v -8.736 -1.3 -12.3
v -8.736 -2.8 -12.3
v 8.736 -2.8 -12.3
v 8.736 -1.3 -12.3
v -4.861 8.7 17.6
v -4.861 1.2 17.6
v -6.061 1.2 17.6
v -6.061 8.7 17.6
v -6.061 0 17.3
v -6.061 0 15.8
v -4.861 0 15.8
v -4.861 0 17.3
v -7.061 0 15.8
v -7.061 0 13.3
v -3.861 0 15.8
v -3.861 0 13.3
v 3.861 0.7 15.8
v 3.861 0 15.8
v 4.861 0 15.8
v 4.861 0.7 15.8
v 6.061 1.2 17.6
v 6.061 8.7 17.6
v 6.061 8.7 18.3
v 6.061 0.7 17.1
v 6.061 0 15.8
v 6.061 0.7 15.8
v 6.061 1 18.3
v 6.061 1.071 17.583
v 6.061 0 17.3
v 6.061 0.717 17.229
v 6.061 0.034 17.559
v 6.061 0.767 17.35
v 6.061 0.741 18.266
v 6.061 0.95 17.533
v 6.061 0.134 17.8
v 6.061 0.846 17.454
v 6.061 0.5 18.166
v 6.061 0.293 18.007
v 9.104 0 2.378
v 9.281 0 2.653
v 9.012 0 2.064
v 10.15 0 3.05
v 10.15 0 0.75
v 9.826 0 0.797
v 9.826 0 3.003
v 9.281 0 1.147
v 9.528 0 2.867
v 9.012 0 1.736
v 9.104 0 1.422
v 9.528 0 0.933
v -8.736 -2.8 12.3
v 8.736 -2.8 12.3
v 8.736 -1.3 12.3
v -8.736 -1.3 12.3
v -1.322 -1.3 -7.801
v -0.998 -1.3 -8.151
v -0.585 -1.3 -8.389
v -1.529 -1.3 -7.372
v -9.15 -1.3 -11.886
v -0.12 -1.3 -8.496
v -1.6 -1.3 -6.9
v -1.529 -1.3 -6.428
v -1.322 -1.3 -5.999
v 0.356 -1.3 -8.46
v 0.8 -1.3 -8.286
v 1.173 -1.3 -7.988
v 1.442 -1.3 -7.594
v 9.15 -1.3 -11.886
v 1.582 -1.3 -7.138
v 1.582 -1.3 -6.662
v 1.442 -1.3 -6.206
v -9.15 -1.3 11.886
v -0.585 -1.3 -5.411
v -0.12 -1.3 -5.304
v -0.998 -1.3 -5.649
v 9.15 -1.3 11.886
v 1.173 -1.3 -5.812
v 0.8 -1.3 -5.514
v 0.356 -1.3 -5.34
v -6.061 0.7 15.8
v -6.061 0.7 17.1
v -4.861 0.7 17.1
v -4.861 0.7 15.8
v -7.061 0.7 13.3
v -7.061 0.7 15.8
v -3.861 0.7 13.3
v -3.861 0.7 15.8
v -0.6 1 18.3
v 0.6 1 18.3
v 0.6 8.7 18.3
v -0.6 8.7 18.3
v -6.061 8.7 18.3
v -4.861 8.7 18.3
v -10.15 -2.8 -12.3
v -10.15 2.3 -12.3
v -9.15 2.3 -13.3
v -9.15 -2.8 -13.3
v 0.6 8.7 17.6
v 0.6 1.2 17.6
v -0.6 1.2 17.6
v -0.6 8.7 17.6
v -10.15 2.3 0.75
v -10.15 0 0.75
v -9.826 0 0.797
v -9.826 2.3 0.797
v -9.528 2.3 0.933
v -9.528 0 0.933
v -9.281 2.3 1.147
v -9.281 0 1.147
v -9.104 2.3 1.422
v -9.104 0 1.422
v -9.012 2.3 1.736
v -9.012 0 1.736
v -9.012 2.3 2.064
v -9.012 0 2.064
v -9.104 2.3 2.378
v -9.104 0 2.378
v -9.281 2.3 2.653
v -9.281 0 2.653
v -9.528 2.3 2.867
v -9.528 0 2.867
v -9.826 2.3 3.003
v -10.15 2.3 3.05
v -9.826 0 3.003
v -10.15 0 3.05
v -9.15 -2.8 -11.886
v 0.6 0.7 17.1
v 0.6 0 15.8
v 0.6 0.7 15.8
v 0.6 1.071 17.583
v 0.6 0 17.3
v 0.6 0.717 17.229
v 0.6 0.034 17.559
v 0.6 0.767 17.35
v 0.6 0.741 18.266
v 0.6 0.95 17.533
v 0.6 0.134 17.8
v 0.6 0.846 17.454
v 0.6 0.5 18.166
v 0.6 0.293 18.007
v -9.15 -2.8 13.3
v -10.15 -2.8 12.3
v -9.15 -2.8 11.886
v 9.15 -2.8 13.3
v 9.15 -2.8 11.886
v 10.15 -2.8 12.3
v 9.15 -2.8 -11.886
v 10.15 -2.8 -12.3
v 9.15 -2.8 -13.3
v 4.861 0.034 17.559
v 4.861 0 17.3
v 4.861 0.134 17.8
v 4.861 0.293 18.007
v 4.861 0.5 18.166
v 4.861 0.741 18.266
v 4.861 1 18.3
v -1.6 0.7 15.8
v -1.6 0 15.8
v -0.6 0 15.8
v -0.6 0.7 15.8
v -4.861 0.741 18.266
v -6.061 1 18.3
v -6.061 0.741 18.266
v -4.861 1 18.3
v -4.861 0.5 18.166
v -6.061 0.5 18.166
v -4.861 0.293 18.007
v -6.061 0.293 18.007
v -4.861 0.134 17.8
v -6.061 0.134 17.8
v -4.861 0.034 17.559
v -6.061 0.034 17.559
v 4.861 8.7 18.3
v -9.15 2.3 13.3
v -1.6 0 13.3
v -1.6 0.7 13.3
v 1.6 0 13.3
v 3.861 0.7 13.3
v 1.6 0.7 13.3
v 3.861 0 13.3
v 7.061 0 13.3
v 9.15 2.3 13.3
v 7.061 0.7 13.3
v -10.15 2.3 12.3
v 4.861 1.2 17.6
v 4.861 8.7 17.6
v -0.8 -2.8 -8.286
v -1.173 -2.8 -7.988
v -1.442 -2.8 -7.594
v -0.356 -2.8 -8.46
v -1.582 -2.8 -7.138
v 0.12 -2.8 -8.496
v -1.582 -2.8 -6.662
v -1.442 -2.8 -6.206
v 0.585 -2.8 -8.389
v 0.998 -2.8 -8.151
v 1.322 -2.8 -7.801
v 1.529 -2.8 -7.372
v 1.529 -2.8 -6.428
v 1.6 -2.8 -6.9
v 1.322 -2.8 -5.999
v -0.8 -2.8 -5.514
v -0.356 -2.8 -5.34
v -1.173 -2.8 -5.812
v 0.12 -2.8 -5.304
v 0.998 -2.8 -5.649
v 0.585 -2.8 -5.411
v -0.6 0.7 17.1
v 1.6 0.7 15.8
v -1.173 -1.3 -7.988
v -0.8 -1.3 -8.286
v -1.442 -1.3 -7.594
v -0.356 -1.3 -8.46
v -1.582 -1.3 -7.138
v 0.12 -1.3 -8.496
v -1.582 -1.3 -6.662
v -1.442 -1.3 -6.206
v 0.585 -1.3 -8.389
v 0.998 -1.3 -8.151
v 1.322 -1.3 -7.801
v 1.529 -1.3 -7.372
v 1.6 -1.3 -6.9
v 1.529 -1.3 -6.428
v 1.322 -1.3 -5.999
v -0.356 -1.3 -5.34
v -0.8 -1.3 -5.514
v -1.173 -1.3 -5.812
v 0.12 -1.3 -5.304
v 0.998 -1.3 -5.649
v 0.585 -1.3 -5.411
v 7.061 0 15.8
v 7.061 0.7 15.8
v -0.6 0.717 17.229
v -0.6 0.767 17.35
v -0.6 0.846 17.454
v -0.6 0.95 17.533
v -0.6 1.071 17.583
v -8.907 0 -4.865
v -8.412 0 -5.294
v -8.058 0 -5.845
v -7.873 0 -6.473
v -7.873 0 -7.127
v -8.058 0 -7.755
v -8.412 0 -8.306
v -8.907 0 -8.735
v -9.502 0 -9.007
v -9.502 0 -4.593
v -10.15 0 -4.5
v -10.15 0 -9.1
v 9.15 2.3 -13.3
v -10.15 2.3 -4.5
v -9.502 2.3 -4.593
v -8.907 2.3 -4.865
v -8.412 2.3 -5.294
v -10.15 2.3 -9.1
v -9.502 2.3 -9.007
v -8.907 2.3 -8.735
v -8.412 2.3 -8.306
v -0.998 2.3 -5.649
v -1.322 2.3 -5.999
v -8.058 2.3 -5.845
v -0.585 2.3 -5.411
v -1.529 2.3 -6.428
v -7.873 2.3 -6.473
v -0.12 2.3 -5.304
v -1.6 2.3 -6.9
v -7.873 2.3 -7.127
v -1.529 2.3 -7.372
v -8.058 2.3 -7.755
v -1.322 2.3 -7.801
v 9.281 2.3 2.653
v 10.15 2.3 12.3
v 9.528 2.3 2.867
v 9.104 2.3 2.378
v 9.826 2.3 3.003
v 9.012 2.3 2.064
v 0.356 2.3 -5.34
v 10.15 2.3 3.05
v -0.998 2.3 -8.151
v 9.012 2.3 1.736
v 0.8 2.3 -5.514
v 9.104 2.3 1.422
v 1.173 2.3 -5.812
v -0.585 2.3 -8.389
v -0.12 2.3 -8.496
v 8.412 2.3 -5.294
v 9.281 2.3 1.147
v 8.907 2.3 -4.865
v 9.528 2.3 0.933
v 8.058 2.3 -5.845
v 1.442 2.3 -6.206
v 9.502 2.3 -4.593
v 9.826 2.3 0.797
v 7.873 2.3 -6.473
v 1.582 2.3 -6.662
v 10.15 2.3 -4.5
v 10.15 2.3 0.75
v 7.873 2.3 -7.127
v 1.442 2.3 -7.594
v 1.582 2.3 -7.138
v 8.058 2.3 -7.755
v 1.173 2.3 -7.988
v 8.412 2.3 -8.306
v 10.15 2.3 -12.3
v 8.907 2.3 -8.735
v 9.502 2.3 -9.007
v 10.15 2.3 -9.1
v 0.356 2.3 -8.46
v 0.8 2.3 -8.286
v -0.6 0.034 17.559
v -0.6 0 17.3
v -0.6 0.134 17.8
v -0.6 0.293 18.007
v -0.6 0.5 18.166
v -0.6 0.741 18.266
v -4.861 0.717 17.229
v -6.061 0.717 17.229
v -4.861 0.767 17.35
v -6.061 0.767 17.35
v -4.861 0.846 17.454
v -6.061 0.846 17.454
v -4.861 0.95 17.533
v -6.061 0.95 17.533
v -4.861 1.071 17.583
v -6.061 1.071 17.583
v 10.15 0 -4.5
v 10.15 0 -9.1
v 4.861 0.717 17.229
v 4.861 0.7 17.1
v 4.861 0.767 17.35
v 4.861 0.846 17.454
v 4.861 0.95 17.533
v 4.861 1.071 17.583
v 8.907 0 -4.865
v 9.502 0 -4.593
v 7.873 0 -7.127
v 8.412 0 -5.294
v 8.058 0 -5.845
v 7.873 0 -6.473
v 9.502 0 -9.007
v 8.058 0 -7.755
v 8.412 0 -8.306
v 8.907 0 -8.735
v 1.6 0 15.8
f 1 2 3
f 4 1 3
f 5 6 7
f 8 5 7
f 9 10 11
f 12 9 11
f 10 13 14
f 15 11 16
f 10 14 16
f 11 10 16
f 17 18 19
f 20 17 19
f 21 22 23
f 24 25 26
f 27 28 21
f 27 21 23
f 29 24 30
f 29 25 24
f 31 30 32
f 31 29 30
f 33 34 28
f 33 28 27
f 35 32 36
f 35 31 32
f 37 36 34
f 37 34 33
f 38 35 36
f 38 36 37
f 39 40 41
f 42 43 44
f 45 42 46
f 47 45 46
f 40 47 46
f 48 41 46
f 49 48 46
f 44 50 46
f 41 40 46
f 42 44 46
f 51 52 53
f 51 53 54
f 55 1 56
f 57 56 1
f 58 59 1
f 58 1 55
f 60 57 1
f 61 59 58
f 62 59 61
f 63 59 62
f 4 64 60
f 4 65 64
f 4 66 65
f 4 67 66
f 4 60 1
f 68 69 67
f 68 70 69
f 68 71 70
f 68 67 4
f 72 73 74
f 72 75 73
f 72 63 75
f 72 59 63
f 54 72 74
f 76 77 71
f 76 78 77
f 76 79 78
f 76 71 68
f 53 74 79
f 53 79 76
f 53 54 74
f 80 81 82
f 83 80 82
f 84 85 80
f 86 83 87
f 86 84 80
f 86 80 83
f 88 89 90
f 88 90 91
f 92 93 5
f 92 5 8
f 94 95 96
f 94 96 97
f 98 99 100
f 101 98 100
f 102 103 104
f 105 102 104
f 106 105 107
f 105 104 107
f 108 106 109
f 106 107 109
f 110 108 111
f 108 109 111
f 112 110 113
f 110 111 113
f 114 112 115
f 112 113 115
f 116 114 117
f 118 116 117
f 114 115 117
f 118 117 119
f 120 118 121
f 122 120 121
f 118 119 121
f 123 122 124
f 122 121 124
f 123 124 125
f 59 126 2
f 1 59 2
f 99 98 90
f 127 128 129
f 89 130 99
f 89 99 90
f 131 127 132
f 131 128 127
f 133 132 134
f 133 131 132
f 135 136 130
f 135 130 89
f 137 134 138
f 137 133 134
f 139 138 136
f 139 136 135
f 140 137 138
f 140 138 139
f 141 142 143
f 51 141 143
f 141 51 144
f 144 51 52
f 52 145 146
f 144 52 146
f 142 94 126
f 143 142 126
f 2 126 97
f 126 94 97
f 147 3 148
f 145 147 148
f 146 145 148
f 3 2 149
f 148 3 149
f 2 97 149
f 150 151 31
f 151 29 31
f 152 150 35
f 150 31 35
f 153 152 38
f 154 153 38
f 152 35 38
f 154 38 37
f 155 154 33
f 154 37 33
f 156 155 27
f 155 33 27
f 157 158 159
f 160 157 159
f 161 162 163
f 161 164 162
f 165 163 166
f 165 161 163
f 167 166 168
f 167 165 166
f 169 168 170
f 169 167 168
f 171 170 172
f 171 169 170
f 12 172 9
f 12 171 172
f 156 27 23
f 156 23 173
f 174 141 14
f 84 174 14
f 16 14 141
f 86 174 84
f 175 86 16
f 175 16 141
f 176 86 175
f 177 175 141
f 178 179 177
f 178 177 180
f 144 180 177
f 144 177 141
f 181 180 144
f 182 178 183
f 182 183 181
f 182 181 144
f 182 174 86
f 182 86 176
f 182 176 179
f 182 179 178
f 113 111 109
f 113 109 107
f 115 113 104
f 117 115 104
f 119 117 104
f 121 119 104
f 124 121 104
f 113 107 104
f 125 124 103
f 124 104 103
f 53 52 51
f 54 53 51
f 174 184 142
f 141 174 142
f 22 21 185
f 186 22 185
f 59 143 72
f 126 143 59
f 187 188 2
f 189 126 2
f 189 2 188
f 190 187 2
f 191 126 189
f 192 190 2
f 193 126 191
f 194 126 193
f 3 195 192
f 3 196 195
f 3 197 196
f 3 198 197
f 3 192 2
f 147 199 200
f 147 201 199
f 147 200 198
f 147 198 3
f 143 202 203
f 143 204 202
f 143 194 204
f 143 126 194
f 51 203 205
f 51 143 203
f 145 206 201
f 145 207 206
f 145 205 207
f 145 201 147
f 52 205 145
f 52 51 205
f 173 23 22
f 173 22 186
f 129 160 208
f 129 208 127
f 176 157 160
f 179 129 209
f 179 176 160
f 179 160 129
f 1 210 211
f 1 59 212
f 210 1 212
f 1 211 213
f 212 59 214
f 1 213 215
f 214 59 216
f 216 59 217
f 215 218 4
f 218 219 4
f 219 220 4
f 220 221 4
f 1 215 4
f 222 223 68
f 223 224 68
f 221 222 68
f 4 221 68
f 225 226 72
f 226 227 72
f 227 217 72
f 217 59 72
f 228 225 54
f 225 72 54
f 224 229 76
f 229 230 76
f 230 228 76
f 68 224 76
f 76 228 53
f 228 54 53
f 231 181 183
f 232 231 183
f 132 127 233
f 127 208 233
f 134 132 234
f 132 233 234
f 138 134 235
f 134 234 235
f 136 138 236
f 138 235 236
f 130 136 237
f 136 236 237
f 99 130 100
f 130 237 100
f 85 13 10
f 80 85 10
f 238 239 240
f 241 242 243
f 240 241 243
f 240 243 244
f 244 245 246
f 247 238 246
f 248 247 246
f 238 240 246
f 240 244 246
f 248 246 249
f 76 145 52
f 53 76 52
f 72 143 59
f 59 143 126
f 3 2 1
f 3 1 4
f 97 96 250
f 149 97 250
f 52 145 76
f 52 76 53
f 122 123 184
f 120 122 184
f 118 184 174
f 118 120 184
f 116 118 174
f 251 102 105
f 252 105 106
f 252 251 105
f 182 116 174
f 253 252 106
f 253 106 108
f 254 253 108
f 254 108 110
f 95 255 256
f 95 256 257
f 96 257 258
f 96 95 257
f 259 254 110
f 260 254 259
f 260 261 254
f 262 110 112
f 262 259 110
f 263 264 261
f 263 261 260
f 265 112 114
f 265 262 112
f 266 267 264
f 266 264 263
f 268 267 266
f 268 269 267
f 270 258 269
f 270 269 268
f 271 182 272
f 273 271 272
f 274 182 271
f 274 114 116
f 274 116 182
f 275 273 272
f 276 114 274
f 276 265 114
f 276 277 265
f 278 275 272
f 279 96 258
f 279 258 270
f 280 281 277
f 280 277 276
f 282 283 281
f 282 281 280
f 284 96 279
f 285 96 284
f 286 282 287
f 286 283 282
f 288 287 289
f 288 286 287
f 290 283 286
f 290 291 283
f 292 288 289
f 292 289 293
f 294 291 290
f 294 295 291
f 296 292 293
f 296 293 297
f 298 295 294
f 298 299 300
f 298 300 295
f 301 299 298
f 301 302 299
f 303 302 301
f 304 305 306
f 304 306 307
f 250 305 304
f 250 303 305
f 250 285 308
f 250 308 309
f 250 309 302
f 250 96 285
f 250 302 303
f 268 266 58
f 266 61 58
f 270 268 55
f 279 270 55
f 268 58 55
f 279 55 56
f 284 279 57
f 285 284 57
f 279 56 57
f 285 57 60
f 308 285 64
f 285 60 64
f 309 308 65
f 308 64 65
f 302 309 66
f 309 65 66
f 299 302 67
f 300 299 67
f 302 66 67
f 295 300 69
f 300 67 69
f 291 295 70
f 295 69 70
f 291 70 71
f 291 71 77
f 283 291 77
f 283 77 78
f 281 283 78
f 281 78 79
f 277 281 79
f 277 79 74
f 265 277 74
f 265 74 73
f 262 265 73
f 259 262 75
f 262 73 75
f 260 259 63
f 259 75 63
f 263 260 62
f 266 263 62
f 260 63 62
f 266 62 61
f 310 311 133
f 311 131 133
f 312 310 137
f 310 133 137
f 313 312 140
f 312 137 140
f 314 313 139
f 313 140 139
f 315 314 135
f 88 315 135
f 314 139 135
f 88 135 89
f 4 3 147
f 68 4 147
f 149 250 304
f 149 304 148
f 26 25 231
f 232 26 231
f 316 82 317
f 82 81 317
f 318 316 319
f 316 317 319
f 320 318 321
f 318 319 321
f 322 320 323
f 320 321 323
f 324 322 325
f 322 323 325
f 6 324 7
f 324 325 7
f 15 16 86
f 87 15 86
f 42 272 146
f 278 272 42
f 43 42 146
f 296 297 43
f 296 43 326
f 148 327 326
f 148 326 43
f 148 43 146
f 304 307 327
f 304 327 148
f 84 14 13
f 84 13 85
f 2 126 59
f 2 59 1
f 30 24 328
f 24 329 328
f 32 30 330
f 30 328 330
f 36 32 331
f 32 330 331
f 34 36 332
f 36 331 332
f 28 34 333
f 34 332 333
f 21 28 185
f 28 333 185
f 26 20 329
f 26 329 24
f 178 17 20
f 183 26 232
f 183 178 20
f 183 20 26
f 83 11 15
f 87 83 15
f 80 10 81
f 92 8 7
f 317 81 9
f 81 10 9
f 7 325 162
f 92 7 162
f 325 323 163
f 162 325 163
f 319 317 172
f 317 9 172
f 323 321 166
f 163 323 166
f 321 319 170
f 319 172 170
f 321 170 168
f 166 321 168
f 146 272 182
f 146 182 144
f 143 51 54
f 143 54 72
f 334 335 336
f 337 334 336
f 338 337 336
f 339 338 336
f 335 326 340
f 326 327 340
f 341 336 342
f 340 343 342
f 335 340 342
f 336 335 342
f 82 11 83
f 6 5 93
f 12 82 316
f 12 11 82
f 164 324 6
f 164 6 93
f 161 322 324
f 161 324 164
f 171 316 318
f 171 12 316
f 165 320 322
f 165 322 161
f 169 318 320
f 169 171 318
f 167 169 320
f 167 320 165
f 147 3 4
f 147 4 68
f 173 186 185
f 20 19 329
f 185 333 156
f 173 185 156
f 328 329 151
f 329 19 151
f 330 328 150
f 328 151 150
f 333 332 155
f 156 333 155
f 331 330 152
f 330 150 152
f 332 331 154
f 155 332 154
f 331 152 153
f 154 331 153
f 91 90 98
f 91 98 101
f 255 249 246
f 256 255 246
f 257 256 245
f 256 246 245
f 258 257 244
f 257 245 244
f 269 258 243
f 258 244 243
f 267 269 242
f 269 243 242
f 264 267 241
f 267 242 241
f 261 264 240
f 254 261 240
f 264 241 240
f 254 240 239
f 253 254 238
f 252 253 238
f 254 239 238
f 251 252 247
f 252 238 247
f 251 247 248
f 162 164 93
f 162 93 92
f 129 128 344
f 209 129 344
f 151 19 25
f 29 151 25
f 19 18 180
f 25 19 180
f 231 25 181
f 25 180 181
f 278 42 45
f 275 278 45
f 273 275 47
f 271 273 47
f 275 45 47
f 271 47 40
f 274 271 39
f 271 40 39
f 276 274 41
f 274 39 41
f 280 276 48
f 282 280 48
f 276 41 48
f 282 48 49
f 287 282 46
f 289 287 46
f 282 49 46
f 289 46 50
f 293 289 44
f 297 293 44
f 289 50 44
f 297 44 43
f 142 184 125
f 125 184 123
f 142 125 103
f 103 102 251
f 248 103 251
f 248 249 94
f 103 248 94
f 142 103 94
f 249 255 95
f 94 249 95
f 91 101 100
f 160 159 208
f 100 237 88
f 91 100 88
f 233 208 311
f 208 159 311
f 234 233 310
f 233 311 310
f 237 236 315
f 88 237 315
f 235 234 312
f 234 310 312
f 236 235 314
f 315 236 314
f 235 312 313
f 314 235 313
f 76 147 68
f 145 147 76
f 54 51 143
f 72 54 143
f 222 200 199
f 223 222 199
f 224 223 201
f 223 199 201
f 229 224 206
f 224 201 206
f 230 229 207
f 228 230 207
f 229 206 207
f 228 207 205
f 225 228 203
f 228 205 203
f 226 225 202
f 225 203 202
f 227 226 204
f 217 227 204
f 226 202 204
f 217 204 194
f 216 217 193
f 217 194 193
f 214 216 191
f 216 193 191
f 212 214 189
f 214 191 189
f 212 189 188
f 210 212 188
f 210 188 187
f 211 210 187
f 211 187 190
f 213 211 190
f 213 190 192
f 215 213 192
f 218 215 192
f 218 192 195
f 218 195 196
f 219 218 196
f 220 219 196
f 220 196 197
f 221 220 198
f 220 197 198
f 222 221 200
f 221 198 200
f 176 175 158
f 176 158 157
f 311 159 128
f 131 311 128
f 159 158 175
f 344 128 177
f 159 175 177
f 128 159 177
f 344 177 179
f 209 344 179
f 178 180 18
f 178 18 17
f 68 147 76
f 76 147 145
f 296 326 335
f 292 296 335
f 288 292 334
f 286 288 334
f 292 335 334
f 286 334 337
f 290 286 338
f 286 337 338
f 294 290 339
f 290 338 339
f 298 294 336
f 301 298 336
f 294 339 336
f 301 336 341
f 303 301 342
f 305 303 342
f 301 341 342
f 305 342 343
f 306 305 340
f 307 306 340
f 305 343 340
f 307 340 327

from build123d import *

# Parameters (mm, degrees)
SKETCH_1_W                  = 20.3
SKETCH_1_H                  = 26.6
EXTRUDE_1_DEPTH             = 5.1
SKETCH_2_W                  = 3.2
SKETCH_2_H                  = 0.7
EXTRUDE_2_DEPTH             = 5
SKETCH_3_W                  = 1
SKETCH_3_H                  = 2.5
CUT_EXTRUDE_1_DEPTH         = 22.112851536
SKETCH_4_W                  = 1
SKETCH_4_H                  = 2.5
CUT_EXTRUDE_2_DEPTH         = 22.112851536
SKETCH_5_W                  = 1.2
SKETCH_5_H                  = 0.7
EXTRUDE_3_DEPTH             = 8
SKETCH_6_W                  = 3.2
SKETCH_6_H                  = 0.7
EXTRUDE_4_DEPTH             = 5
SKETCH_7_W                  = 1
SKETCH_7_H                  = 2.5
CUT_EXTRUDE_3_DEPTH         = 23.662799915
SKETCH_8_W                  = 1
SKETCH_8_H                  = 2.5
CUT_EXTRUDE_4_DEPTH         = 23.662799915
SKETCH_9_W                  = 1.2
SKETCH_9_H                  = 0.7
EXTRUDE_5_DEPTH             = 8
SKETCH_10_W                 = 3.2
SKETCH_10_H                 = 0.7
EXTRUDE_6_DEPTH             = 5
SKETCH_11_W                 = 1
SKETCH_11_H                 = 2.5
CUT_EXTRUDE_5_DEPTH         = 23.662799915
SKETCH_12_W                 = 1
SKETCH_12_H                 = 2.5
CUT_EXTRUDE_6_DEPTH         = 23.662799915
SKETCH_13_W                 = 1.2
SKETCH_13_H                 = 0.7
EXTRUDE_7_DEPTH             = 8
HOLE_WIZARD_3_2_3_2_1_D     = 3.2
HOLE_WIZARD_2_3_2_3_1_D     = 2.3
HOLE_WIZARD_2_3_2_3_1_DEPTH = 2.3
HOLE_WIZARD_4_6_4_6_1_D     = 4.6
HOLE_WIZARD_4_6_4_6_1_DEPTH = 2.3
CHAMFER_1_SIZE              = 1
FILLET_1_R                  = 0.5
FILLET_2_R                  = 1
SKETCH_20_R                 = 1.6
CUT_EXTRUDE_7_DEPTH         = 1.5
SKETCH_20_4_R               = 1.6
EXTRUDE_9_DEPTH             = 1.5


with BuildPart() as part:
    # Эскиз1 → Бобышка-Вытянуть1 (new body)
    with BuildSketch(Plane(origin=(0, 2.3, 0), x_dir=(1, 0, 0), z_dir=(0, 1, 0))):
        Rectangle(SKETCH_1_W, SKETCH_1_H)
    extrude(amount=-EXTRUDE_1_DEPTH)

    # Эскиз2 → Бобышка-Вытянуть2 (add)
    with BuildSketch(Plane.XY.offset(13.3)):
        with Locations((5.461, 0.35)):
            Rectangle(SKETCH_2_W, SKETCH_2_H)
    extrude(amount=EXTRUDE_2_DEPTH)

    # Эскиз3 → Вырез-Вытянуть1 (cut, through all)
    with BuildSketch(Plane.XZ):
        with Locations((4.361, 17.05)):
            Rectangle(SKETCH_3_W, SKETCH_3_H)
    extrude(amount=-CUT_EXTRUDE_1_DEPTH, mode=Mode.SUBTRACT)

    # Эскиз4 → Вырез-Вытянуть2 (cut, through all)
    with BuildSketch(Plane.XZ):
        with Locations((6.561, 17.05)):
            Rectangle(SKETCH_4_W, SKETCH_4_H)
    extrude(amount=-CUT_EXTRUDE_2_DEPTH, mode=Mode.SUBTRACT)

    # Эскиз5 → Бобышка-Вытянуть3 (add)
    with BuildSketch(Plane(origin=(0, 0.7, 0), x_dir=(-1, 0, 0), z_dir=(0, 1, 0))):
        with Locations((-5.461, 17.95)):
            Rectangle(SKETCH_5_W, SKETCH_5_H)
    extrude(amount=EXTRUDE_3_DEPTH)

    # Эскиз6 → Бобышка-Вытянуть4 (add)
    with BuildSketch(Plane.XY.offset(13.3)):
        with Locations((0, 0.35)):
            Rectangle(SKETCH_6_W, SKETCH_6_H)
    extrude(amount=EXTRUDE_4_DEPTH)

    # Эскиз7 → Вырез-Вытянуть3 (cut, through all)
    with BuildSketch(Plane.XZ):
        with Locations((-1.1, 17.05)):
            Rectangle(SKETCH_7_W, SKETCH_7_H)
    extrude(amount=-CUT_EXTRUDE_3_DEPTH, mode=Mode.SUBTRACT)

    # Эскиз8 → Вырез-Вытянуть4 (cut, through all)
    with BuildSketch(Plane.XZ):
        with Locations((1.1, 17.05)):
            Rectangle(SKETCH_8_W, SKETCH_8_H)
    extrude(amount=-CUT_EXTRUDE_4_DEPTH, mode=Mode.SUBTRACT)

    # Эскиз9 → Бобышка-Вытянуть5 (add)
    with BuildSketch(Plane(origin=(0, 0.7, 0), x_dir=(-1, 0, 0), z_dir=(0, 1, 0))):
        with Locations((0, 17.95)):
            Rectangle(SKETCH_9_W, SKETCH_9_H)
    extrude(amount=EXTRUDE_5_DEPTH)

    # Эскиз10 → Бобышка-Вытянуть6 (add)
    with BuildSketch(Plane.XY.offset(13.3)):
        with Locations((-5.461, 0.35)):
            Rectangle(SKETCH_10_W, SKETCH_10_H)
    extrude(amount=EXTRUDE_6_DEPTH)

    # Эскиз11 → Вырез-Вытянуть5 (cut, through all)
    with BuildSketch(Plane.XZ):
        with Locations((-6.561, 17.05)):
            Rectangle(SKETCH_11_W, SKETCH_11_H)
    extrude(amount=-CUT_EXTRUDE_5_DEPTH, mode=Mode.SUBTRACT)

    # Эскиз12 → Вырез-Вытянуть6 (cut, through all)
    with BuildSketch(Plane.XZ):
        with Locations((-4.361, 17.05)):
            Rectangle(SKETCH_12_W, SKETCH_12_H)
    extrude(amount=-CUT_EXTRUDE_6_DEPTH, mode=Mode.SUBTRACT)

    # Эскиз13 → Бобышка-Вытянуть7 (add)
    with BuildSketch(Plane(origin=(0, 0.7, 0), x_dir=(-1, 0, 0), z_dir=(0, 1, 0))):
        with Locations((5.461, 17.95)):
            Rectangle(SKETCH_13_W, SKETCH_13_H)
    extrude(amount=EXTRUDE_7_DEPTH)

    # Диаметр отверстия Ø3.2 (3.2)1 (through all)
    with Locations(Plane(origin=(0, 2.3, 0), x_dir=(1, 0, 0), z_dir=(0, 1, 0))):
        with Locations((0, 6.9)):
            Hole(HOLE_WIZARD_3_2_3_2_1_D / 2)

    # Диаметр отверстия Ø2.3 (2.3)1
    with Locations(Plane(origin=(0, 2.3, 0), x_dir=(1, 0, 0), z_dir=(0, 1, 0))):
        with Locations((10.15, -1.9), (-10.15, -1.9)):
            Hole(HOLE_WIZARD_2_3_2_3_1_D / 2, depth=HOLE_WIZARD_2_3_2_3_1_DEPTH)

    # Диаметр отверстия Ø4.6 (4.6)1
    with Locations(Plane(origin=(0, 2.3, 0), x_dir=(1, 0, 0), z_dir=(0, 1, 0))):
        with Locations((10.15, 6.8), (-10.15, 6.8)):
            Hole(HOLE_WIZARD_4_6_4_6_1_D / 2, depth=HOLE_WIZARD_4_6_4_6_1_DEPTH)

    # Фаска1
    chamfer_1_edges = [part.edges().sort_by_distance(p)[0] for p in [
        (10.15, -0.25, 13.3),
        (-10.15, -0.25, 13.3),
        (10.15, -0.25, -13.3),
        (-10.15, -0.25, -13.3),
    ]]
    chamfer(chamfer_1_edges, length=CHAMFER_1_SIZE)

    # Скругление1
    fillet_1_edges = [part.edges().sort_by_distance(p)[0] for p in [
        (-5.461, 0.7, 17.6),
        (0, 0.7, 17.6),
        (5.461, 0.7, 17.6),
    ]]
    fillet(fillet_1_edges, radius=FILLET_1_R)

    # Скругление2
    fillet_2_edges = [part.edges().sort_by_distance(p)[0] for p in [
        (0, 0, 18.3),
        (-5.461, 0, 18.3),
        (5.461, 0, 18.3),
    ]]
    fillet(fillet_2_edges, radius=FILLET_2_R)

    # Эскиз20 → Вырез-Вытянуть7 (cut)
    with BuildSketch(Plane.XZ.offset(2.8)):
        Polygon((8.735786438, -12.3), (9.15, -11.885786438), (9.15, 11.885786438), (8.735786438, 12.3), (-8.735786438, 12.3), (-9.15, 11.885786438), (-9.15, -11.885786438), (-8.735786438, -12.3), align=None)
        with Locations((0, -6.9)):
            Circle(SKETCH_20_R, mode=Mode.SUBTRACT)
    extrude(amount=-CUT_EXTRUDE_7_DEPTH, mode=Mode.SUBTRACT)


with BuildPart() as body_2:
    # Эскиз20<4> → Бобышка-Вытянуть9 (new body)
    with BuildSketch(Plane.XZ.offset(2.8)):
        Polygon((8.735786438, -12.3), (9.15, -11.885786438), (9.15, 11.885786438), (8.735786438, 12.3), (-8.735786438, 12.3), (-9.15, 11.885786438), (-9.15, -11.885786438), (-8.735786438, -12.3), align=None)
        with Locations((0, -6.9)):
            Circle(SKETCH_20_4_R, mode=Mode.SUBTRACT)
    extrude(amount=-EXTRUDE_9_DEPTH)


solid = Compound([part.part, body_2.part])
